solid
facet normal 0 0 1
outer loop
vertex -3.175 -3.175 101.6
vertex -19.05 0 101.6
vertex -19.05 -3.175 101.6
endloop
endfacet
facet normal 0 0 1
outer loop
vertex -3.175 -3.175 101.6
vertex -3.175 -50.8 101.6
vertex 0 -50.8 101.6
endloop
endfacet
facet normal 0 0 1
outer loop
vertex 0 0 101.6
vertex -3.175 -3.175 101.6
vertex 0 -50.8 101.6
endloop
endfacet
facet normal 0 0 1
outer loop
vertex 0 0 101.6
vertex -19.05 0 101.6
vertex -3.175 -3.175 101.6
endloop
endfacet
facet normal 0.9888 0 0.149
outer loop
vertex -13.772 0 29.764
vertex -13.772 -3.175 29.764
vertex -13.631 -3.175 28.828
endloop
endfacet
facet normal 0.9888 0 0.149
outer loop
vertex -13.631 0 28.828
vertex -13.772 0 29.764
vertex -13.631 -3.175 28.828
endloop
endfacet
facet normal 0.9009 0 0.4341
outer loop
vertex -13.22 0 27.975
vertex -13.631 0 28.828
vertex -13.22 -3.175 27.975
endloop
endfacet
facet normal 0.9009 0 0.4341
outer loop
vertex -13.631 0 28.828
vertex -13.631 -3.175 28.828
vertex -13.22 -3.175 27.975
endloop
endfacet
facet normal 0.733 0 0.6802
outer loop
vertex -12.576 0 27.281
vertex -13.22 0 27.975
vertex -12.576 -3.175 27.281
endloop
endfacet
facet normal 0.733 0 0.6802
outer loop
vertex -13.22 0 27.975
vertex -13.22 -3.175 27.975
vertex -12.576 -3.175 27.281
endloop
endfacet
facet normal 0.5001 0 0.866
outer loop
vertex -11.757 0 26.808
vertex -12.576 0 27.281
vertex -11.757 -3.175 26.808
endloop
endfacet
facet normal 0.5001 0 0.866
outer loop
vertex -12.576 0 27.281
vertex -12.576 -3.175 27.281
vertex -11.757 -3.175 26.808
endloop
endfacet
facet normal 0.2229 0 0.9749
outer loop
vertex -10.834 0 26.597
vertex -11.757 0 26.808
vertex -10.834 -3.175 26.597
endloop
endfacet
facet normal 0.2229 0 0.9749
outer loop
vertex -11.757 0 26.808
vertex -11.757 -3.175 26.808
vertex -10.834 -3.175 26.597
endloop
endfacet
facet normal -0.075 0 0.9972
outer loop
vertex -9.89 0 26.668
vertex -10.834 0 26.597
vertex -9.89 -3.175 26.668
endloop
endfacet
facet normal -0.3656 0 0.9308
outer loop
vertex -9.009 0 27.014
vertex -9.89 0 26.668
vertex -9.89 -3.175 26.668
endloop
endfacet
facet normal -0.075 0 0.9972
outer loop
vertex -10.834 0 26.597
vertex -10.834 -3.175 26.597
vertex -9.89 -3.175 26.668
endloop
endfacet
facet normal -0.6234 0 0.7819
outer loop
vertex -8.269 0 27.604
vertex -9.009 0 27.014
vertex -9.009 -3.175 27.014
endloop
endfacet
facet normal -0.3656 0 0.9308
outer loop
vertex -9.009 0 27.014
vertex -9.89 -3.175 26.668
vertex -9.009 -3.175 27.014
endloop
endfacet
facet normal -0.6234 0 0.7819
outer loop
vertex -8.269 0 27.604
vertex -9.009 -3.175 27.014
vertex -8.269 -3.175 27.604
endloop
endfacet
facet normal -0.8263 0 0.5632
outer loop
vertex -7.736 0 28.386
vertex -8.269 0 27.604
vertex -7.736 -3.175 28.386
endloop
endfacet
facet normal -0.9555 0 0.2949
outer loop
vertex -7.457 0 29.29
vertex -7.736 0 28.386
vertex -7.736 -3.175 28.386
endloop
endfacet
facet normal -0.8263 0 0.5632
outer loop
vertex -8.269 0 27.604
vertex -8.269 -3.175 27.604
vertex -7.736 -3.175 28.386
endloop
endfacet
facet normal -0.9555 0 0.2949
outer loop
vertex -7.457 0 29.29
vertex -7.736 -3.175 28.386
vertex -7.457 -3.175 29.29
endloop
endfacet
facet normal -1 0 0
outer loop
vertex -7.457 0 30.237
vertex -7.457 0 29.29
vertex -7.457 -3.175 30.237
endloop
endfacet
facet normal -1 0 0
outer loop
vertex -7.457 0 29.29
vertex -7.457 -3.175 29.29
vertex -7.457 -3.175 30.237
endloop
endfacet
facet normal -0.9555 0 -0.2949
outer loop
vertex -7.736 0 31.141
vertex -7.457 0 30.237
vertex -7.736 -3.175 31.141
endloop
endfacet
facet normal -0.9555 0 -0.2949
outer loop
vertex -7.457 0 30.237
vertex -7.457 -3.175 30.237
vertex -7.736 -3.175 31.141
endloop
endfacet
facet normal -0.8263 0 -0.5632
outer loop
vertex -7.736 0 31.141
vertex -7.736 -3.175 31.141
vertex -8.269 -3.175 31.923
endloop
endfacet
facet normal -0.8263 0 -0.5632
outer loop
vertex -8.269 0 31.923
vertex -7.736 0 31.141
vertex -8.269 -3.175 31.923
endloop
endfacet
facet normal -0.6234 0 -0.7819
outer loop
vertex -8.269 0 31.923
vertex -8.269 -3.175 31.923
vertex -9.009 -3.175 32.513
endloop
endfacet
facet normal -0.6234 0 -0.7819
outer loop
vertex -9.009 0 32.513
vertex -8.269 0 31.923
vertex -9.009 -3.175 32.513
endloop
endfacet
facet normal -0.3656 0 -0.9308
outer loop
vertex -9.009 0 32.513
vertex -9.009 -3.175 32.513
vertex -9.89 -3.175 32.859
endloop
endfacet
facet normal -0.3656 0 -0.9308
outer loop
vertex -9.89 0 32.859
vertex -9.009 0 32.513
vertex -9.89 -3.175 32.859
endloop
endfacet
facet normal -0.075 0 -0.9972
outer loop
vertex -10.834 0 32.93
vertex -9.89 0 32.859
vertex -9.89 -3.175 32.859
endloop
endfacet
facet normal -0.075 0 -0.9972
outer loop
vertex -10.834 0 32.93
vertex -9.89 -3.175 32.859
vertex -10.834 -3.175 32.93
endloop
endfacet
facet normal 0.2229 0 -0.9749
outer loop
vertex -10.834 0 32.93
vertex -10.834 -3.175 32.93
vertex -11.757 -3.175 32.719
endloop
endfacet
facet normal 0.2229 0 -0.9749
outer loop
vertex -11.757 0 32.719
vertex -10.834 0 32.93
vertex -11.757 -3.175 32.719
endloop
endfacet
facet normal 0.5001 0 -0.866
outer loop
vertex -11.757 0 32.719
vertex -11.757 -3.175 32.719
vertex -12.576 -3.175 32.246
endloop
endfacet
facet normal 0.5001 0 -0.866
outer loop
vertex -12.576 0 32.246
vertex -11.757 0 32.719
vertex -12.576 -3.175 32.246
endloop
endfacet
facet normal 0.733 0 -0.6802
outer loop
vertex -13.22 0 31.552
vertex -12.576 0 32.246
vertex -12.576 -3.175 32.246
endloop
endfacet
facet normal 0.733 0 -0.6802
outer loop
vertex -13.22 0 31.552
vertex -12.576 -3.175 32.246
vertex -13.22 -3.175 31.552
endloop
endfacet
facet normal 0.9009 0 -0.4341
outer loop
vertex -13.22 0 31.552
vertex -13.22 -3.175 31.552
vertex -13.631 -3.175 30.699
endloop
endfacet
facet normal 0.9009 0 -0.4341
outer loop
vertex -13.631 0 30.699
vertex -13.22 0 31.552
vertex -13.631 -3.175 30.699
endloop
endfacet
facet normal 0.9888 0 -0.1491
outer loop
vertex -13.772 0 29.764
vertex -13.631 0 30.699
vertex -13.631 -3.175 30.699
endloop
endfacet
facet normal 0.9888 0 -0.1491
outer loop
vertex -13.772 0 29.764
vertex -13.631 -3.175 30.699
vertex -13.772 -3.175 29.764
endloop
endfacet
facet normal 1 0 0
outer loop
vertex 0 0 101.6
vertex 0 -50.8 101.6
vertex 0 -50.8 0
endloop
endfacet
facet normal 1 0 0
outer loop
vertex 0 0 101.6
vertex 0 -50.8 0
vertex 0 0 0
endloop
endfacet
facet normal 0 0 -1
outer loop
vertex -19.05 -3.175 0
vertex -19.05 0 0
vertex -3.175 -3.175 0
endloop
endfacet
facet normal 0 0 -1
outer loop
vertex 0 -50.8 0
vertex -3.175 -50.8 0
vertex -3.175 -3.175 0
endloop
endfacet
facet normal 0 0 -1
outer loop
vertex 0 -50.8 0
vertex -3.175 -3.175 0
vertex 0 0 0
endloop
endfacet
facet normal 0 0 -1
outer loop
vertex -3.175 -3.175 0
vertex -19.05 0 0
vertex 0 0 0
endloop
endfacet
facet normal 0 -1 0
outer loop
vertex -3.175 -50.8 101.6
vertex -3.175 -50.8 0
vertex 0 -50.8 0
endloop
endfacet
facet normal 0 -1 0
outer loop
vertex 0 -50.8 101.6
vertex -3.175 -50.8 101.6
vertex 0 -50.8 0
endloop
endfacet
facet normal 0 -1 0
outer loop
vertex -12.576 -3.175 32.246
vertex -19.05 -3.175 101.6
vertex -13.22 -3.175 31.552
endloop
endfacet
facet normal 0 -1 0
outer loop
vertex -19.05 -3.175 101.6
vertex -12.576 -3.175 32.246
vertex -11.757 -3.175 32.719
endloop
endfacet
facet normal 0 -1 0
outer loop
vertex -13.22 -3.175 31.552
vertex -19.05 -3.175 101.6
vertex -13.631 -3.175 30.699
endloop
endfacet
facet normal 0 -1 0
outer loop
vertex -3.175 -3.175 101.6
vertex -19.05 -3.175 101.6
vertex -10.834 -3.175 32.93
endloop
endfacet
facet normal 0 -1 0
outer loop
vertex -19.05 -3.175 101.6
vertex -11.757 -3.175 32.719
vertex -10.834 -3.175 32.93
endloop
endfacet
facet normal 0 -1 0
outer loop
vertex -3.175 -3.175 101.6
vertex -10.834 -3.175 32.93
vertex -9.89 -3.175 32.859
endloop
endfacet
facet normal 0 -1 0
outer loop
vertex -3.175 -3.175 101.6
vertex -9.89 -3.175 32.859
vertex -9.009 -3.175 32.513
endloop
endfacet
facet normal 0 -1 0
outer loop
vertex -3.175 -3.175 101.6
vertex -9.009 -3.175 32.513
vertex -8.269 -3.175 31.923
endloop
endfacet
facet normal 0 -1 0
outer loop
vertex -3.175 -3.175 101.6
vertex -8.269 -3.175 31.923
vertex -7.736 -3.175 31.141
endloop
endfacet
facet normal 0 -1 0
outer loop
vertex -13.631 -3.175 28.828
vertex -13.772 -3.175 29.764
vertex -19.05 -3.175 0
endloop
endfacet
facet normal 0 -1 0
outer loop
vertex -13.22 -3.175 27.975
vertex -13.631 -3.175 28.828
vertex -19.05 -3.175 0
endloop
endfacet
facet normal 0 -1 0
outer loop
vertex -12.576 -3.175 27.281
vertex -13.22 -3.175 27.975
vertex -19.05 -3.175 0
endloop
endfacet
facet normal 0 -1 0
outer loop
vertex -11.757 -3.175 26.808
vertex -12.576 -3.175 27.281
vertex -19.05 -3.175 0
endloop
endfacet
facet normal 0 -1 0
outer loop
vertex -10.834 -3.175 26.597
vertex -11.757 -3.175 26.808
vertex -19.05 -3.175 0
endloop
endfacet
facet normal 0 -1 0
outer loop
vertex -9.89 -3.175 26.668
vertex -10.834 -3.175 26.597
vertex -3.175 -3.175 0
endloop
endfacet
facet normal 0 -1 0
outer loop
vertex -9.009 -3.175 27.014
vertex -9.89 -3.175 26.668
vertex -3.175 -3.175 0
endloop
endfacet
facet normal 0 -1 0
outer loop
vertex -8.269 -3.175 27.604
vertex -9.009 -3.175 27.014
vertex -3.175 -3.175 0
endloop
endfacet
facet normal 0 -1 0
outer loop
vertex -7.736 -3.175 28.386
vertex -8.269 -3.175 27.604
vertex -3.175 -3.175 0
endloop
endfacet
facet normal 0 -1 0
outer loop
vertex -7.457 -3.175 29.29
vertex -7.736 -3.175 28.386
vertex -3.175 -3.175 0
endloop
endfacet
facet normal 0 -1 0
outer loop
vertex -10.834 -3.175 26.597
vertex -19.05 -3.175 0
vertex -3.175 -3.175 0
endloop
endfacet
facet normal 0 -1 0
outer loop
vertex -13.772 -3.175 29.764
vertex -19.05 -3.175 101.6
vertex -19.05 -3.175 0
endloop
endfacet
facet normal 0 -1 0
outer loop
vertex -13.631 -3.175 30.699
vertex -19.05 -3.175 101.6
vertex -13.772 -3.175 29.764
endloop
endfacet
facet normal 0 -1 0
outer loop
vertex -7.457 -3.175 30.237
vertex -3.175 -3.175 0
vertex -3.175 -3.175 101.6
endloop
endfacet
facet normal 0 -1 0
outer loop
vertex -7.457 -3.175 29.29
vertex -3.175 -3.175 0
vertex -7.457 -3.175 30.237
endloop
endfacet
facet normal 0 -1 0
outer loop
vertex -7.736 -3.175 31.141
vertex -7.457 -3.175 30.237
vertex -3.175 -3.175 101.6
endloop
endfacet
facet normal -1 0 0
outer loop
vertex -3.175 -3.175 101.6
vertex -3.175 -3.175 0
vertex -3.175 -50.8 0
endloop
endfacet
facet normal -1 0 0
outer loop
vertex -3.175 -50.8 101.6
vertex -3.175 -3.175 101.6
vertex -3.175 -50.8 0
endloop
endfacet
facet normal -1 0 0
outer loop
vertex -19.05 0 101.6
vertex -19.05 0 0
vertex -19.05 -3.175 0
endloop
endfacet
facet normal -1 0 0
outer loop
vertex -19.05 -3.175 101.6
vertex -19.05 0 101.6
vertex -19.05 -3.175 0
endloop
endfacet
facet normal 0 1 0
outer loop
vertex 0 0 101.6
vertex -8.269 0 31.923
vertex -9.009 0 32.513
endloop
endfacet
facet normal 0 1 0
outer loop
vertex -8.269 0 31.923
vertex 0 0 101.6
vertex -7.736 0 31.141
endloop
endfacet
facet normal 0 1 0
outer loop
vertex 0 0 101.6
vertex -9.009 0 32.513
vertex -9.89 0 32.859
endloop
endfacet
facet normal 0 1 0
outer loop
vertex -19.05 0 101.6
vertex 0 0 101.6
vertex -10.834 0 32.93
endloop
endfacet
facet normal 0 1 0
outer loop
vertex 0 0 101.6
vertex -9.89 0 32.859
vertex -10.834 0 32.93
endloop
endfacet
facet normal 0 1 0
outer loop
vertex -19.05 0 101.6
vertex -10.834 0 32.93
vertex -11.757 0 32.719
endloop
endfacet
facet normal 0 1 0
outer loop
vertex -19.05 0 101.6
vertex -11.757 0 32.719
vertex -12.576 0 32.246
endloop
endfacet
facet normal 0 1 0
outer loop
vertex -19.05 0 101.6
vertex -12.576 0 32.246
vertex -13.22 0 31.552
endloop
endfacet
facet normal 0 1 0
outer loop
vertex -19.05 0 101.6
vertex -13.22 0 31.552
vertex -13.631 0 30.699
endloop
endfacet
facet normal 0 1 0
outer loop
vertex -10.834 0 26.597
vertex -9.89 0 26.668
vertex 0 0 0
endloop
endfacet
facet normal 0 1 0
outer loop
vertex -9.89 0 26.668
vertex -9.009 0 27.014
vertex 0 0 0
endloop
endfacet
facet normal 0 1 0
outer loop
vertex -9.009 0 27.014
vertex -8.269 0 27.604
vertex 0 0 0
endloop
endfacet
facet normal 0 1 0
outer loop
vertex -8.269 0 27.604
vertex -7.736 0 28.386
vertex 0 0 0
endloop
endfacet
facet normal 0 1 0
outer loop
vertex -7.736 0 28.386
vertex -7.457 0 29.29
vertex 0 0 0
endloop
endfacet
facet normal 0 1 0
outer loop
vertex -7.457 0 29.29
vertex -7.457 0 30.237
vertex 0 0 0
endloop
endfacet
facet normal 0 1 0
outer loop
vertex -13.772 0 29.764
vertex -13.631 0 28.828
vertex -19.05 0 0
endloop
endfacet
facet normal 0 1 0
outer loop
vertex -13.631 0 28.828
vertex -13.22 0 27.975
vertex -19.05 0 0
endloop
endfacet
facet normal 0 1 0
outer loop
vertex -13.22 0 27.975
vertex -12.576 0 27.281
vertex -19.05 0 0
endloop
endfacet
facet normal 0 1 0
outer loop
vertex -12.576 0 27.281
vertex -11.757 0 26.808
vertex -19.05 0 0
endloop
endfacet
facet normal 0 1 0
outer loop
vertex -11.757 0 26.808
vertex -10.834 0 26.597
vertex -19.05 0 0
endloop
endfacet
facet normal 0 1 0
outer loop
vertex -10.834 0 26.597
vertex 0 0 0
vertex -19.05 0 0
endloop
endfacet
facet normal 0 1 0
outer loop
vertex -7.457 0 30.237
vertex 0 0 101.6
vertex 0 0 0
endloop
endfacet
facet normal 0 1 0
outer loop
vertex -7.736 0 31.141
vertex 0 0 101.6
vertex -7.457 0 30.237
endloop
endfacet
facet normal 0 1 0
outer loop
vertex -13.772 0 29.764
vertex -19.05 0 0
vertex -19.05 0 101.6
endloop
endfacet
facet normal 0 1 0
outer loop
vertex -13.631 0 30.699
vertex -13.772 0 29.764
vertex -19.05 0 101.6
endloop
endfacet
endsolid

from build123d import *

# Parameters (mm, degrees)
F1_DEPTH = 101.6
F3_D     = 6.35


with BuildPart() as f1:
    # F0 (on Top) → F1 (new body)
    with BuildSketch(Plane.XY):
        Polygon((0, 0), (-19.05, 0), (-19.05, -3.175), (-3.175, -3.175), (-3.175, -50.8), (0, -50.8), align=None)
    extrude(amount=F1_DEPTH)

    # F3 (through all)
    with Locations(Plane(origin=(0, 0, 0), x_dir=(1, 0, 0), z_dir=(0, 1, 0))):
        with Locations((-10.5969142169, -29.7635085881)):
            Hole(F3_D / 2)


solid = f1.part
